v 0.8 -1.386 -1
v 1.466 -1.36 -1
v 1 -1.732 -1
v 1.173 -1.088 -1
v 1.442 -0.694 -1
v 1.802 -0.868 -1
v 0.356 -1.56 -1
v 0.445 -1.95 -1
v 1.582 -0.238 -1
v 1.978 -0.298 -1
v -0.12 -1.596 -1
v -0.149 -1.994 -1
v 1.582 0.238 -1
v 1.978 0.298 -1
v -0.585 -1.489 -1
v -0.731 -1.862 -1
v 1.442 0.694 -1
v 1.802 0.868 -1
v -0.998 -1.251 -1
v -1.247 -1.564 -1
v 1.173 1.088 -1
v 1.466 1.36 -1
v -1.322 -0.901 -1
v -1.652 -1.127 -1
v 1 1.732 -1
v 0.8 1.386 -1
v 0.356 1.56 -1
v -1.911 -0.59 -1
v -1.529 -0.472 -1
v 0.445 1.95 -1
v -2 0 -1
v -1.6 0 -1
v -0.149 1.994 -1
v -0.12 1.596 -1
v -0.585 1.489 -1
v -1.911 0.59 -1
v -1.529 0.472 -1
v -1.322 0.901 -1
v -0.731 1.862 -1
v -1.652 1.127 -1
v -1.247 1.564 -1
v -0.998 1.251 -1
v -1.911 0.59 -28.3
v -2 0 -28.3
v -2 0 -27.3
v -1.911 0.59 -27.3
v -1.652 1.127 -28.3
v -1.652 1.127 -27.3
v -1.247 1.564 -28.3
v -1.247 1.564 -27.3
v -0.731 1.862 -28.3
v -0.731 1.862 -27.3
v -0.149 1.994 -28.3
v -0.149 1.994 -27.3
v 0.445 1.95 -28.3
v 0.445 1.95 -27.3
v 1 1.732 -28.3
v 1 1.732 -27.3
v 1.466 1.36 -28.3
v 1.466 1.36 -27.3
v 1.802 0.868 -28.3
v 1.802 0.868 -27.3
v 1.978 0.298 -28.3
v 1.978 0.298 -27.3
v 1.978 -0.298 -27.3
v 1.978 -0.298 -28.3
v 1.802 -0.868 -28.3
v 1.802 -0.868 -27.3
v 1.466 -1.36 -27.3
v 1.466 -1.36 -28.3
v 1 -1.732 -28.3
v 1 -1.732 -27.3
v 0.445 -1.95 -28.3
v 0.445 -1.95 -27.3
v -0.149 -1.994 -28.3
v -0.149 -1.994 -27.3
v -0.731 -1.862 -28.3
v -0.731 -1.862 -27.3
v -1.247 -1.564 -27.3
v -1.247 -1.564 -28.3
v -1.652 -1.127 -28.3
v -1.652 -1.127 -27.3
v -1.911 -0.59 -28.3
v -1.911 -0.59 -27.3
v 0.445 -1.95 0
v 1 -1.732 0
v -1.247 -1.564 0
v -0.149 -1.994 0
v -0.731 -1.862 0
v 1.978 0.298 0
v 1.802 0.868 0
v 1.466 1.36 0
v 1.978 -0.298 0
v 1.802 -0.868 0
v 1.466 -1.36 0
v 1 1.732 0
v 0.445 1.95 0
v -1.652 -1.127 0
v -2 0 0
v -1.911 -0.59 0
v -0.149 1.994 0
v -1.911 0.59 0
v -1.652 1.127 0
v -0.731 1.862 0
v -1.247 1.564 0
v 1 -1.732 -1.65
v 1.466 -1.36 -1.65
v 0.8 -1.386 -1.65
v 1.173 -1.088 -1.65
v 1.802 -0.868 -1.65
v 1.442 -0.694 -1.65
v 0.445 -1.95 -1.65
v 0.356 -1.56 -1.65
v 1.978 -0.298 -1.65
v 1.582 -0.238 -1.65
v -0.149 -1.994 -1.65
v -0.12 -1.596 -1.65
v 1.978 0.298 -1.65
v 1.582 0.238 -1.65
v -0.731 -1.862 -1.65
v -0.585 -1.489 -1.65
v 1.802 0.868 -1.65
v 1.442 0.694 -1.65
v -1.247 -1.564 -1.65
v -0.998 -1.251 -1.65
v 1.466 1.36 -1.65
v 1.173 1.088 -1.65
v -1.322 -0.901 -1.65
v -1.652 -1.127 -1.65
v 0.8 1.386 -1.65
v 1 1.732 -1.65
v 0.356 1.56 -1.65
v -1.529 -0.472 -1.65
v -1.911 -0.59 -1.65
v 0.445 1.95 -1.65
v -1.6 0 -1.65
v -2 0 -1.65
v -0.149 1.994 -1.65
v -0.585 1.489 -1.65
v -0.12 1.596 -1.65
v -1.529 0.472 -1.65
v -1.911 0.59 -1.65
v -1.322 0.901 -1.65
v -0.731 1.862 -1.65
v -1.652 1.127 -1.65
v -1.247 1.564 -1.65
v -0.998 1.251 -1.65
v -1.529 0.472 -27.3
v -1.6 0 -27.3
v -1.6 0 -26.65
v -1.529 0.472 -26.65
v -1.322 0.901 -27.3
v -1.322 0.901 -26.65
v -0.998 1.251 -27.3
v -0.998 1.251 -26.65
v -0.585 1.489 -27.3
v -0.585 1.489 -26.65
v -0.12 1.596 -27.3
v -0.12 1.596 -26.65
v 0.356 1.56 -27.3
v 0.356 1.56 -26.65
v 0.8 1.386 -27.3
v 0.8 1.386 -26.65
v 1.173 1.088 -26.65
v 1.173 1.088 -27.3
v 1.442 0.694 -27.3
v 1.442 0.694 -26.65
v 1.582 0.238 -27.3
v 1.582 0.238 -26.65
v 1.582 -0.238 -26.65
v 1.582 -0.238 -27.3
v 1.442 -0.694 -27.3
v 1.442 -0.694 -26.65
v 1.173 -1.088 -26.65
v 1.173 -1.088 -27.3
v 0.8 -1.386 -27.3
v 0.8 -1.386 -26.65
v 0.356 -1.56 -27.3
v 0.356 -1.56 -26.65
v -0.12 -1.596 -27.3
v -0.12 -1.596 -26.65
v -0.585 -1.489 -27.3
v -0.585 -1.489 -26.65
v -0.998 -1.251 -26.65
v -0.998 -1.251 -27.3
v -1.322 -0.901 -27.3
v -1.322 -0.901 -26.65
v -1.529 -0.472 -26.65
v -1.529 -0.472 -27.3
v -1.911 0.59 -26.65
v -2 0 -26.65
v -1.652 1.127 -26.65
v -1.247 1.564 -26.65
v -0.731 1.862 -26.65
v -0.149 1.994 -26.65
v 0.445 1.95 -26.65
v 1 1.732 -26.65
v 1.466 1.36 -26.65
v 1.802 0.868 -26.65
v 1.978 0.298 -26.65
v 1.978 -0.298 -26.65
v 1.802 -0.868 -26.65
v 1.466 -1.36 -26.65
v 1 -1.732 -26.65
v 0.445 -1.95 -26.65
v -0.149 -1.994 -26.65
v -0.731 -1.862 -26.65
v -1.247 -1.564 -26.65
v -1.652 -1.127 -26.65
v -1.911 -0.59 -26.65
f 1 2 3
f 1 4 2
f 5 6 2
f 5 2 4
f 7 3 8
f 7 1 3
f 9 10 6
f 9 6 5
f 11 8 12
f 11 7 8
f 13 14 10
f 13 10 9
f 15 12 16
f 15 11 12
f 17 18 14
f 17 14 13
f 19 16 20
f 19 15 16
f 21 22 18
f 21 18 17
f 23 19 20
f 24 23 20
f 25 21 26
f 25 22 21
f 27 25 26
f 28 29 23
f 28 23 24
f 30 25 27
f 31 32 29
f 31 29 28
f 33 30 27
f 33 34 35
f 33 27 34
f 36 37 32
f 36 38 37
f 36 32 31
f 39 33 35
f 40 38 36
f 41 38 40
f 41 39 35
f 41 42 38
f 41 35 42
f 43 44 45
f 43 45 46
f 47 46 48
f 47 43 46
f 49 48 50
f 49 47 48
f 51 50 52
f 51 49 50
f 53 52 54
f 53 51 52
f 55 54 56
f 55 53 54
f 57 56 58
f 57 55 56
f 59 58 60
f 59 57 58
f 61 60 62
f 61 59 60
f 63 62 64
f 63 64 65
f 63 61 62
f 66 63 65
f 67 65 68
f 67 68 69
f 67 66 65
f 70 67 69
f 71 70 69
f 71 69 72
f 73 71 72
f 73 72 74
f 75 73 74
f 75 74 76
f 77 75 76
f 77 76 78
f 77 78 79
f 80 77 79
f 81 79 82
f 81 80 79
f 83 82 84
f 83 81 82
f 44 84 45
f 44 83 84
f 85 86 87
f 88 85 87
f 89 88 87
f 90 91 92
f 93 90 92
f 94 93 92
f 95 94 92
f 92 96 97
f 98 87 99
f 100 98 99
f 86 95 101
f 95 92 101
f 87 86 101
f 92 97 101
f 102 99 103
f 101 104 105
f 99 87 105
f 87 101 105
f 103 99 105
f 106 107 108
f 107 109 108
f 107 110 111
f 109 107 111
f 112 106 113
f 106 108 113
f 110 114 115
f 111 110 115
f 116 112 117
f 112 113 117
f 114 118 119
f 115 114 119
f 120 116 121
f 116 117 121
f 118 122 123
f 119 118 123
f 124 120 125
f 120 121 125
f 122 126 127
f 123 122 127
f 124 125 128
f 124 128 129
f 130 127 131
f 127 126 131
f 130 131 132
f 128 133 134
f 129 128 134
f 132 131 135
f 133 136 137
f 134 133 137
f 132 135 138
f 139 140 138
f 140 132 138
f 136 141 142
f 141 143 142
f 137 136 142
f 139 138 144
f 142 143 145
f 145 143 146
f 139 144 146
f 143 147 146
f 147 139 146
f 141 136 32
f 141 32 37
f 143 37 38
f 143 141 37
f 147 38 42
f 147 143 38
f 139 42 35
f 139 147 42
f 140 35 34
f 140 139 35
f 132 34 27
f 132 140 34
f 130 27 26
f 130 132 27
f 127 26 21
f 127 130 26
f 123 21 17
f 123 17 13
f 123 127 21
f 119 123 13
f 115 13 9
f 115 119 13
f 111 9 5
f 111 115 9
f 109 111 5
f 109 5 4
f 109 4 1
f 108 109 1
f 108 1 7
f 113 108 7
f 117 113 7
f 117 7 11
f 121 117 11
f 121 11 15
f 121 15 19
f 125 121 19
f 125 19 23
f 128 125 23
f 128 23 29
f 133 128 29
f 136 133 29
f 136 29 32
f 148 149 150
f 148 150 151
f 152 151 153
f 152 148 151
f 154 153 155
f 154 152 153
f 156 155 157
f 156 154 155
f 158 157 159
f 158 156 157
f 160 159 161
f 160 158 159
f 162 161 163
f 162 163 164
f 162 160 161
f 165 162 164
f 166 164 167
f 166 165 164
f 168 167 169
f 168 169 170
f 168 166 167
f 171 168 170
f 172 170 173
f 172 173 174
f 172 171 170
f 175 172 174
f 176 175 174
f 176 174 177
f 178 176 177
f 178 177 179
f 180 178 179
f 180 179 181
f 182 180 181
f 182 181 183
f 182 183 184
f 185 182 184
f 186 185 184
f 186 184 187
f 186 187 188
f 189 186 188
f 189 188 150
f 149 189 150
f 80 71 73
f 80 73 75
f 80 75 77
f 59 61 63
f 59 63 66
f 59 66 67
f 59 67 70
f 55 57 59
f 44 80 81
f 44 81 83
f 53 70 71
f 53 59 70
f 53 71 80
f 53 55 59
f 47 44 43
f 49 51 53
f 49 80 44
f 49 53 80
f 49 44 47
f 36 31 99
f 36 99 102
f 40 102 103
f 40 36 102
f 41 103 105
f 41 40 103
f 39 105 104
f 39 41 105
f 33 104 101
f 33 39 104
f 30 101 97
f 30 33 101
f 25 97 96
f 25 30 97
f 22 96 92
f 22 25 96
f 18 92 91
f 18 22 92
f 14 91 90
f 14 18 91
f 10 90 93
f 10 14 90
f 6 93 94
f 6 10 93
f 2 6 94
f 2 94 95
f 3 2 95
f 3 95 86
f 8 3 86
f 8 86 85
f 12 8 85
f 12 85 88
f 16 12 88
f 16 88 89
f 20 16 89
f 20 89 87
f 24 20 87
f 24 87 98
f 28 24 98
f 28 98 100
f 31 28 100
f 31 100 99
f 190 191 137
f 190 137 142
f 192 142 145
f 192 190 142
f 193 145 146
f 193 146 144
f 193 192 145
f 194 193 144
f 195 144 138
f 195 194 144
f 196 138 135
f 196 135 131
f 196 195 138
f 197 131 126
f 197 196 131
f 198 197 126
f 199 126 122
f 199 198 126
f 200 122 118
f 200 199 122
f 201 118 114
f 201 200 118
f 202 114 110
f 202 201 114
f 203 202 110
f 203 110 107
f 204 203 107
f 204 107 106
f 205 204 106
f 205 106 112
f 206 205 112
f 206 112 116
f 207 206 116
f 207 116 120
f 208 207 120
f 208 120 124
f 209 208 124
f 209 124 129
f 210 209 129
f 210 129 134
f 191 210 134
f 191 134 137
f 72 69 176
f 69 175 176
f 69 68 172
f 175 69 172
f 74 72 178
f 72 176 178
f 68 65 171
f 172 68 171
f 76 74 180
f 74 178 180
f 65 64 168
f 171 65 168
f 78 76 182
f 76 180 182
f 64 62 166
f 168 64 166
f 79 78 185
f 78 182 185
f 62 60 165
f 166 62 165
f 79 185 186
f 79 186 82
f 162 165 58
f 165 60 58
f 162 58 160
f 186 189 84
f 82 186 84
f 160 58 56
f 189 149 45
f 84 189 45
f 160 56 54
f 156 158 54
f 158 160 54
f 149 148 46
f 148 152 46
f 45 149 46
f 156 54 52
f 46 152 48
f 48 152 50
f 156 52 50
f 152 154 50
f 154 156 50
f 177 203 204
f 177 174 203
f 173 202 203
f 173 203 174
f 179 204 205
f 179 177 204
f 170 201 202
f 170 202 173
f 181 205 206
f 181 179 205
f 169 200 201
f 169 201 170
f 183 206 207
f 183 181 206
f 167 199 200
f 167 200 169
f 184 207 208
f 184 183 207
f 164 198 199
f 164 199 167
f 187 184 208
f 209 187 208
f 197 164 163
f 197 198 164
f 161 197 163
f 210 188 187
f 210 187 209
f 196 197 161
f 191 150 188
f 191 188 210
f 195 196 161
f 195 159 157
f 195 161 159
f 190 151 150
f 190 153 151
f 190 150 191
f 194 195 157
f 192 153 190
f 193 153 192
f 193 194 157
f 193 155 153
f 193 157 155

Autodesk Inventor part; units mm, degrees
ref_plane "YZ Plane" through (0, 0, 0) normal (1, 0, 0) x (0, 1, 0)
ref_plane "XZ Plane" through (0, 0, 0) normal (0, 1, 0) x (-1, 0, 0)
ref_plane "XY Plane" through (0, 0, 0) normal (0, 0, 1) x (1, 0, 0)
sketch "Skizze1" plane through (0, 0, 0) normal (0, 1, 0) x (-1, 0, 0)
  line L0 (0, 0) -> (2, 0)
  line L1 (2, 0) -> (2, -1)
  line L2 (2, -1) -> (1.6, -1)
  line L3 (1.6, -1) -> (1.6, -1.65)
  line L4 (1.6, -1.65) -> (2, -1.65)
  line L5 (2, -1.65) -> (2, -26.65)
  line L6 (2, -26.65) -> (1.6, -26.65)
  line L7 (1.6, -26.65) -> (1.6, -27.3)
  line L8 (1.6, -27.3) -> (2, -27.3)
  line L9 (2, -27.3) -> (2, -28.3)
  line L10 (2, -28.3) -> (0, -28.3)
  line L11 (0, 0) -> (0, -28.3)
  dimension "d0" = 2
  dimension "d1" = 1
  dimension "d2" = 0.65
  dimension "d3" = 0.65
  dimension "d5" = 1
  dimension "d6" = 4
  dimension "d7" = 3.2
  dimension "d9" = 25
revolve "Umdrehung1" add sketch "Skizze1" angle 360 about axis through (0, 0, 0) along (0, 0, -1)
properties part number "Kipphebelachse"
